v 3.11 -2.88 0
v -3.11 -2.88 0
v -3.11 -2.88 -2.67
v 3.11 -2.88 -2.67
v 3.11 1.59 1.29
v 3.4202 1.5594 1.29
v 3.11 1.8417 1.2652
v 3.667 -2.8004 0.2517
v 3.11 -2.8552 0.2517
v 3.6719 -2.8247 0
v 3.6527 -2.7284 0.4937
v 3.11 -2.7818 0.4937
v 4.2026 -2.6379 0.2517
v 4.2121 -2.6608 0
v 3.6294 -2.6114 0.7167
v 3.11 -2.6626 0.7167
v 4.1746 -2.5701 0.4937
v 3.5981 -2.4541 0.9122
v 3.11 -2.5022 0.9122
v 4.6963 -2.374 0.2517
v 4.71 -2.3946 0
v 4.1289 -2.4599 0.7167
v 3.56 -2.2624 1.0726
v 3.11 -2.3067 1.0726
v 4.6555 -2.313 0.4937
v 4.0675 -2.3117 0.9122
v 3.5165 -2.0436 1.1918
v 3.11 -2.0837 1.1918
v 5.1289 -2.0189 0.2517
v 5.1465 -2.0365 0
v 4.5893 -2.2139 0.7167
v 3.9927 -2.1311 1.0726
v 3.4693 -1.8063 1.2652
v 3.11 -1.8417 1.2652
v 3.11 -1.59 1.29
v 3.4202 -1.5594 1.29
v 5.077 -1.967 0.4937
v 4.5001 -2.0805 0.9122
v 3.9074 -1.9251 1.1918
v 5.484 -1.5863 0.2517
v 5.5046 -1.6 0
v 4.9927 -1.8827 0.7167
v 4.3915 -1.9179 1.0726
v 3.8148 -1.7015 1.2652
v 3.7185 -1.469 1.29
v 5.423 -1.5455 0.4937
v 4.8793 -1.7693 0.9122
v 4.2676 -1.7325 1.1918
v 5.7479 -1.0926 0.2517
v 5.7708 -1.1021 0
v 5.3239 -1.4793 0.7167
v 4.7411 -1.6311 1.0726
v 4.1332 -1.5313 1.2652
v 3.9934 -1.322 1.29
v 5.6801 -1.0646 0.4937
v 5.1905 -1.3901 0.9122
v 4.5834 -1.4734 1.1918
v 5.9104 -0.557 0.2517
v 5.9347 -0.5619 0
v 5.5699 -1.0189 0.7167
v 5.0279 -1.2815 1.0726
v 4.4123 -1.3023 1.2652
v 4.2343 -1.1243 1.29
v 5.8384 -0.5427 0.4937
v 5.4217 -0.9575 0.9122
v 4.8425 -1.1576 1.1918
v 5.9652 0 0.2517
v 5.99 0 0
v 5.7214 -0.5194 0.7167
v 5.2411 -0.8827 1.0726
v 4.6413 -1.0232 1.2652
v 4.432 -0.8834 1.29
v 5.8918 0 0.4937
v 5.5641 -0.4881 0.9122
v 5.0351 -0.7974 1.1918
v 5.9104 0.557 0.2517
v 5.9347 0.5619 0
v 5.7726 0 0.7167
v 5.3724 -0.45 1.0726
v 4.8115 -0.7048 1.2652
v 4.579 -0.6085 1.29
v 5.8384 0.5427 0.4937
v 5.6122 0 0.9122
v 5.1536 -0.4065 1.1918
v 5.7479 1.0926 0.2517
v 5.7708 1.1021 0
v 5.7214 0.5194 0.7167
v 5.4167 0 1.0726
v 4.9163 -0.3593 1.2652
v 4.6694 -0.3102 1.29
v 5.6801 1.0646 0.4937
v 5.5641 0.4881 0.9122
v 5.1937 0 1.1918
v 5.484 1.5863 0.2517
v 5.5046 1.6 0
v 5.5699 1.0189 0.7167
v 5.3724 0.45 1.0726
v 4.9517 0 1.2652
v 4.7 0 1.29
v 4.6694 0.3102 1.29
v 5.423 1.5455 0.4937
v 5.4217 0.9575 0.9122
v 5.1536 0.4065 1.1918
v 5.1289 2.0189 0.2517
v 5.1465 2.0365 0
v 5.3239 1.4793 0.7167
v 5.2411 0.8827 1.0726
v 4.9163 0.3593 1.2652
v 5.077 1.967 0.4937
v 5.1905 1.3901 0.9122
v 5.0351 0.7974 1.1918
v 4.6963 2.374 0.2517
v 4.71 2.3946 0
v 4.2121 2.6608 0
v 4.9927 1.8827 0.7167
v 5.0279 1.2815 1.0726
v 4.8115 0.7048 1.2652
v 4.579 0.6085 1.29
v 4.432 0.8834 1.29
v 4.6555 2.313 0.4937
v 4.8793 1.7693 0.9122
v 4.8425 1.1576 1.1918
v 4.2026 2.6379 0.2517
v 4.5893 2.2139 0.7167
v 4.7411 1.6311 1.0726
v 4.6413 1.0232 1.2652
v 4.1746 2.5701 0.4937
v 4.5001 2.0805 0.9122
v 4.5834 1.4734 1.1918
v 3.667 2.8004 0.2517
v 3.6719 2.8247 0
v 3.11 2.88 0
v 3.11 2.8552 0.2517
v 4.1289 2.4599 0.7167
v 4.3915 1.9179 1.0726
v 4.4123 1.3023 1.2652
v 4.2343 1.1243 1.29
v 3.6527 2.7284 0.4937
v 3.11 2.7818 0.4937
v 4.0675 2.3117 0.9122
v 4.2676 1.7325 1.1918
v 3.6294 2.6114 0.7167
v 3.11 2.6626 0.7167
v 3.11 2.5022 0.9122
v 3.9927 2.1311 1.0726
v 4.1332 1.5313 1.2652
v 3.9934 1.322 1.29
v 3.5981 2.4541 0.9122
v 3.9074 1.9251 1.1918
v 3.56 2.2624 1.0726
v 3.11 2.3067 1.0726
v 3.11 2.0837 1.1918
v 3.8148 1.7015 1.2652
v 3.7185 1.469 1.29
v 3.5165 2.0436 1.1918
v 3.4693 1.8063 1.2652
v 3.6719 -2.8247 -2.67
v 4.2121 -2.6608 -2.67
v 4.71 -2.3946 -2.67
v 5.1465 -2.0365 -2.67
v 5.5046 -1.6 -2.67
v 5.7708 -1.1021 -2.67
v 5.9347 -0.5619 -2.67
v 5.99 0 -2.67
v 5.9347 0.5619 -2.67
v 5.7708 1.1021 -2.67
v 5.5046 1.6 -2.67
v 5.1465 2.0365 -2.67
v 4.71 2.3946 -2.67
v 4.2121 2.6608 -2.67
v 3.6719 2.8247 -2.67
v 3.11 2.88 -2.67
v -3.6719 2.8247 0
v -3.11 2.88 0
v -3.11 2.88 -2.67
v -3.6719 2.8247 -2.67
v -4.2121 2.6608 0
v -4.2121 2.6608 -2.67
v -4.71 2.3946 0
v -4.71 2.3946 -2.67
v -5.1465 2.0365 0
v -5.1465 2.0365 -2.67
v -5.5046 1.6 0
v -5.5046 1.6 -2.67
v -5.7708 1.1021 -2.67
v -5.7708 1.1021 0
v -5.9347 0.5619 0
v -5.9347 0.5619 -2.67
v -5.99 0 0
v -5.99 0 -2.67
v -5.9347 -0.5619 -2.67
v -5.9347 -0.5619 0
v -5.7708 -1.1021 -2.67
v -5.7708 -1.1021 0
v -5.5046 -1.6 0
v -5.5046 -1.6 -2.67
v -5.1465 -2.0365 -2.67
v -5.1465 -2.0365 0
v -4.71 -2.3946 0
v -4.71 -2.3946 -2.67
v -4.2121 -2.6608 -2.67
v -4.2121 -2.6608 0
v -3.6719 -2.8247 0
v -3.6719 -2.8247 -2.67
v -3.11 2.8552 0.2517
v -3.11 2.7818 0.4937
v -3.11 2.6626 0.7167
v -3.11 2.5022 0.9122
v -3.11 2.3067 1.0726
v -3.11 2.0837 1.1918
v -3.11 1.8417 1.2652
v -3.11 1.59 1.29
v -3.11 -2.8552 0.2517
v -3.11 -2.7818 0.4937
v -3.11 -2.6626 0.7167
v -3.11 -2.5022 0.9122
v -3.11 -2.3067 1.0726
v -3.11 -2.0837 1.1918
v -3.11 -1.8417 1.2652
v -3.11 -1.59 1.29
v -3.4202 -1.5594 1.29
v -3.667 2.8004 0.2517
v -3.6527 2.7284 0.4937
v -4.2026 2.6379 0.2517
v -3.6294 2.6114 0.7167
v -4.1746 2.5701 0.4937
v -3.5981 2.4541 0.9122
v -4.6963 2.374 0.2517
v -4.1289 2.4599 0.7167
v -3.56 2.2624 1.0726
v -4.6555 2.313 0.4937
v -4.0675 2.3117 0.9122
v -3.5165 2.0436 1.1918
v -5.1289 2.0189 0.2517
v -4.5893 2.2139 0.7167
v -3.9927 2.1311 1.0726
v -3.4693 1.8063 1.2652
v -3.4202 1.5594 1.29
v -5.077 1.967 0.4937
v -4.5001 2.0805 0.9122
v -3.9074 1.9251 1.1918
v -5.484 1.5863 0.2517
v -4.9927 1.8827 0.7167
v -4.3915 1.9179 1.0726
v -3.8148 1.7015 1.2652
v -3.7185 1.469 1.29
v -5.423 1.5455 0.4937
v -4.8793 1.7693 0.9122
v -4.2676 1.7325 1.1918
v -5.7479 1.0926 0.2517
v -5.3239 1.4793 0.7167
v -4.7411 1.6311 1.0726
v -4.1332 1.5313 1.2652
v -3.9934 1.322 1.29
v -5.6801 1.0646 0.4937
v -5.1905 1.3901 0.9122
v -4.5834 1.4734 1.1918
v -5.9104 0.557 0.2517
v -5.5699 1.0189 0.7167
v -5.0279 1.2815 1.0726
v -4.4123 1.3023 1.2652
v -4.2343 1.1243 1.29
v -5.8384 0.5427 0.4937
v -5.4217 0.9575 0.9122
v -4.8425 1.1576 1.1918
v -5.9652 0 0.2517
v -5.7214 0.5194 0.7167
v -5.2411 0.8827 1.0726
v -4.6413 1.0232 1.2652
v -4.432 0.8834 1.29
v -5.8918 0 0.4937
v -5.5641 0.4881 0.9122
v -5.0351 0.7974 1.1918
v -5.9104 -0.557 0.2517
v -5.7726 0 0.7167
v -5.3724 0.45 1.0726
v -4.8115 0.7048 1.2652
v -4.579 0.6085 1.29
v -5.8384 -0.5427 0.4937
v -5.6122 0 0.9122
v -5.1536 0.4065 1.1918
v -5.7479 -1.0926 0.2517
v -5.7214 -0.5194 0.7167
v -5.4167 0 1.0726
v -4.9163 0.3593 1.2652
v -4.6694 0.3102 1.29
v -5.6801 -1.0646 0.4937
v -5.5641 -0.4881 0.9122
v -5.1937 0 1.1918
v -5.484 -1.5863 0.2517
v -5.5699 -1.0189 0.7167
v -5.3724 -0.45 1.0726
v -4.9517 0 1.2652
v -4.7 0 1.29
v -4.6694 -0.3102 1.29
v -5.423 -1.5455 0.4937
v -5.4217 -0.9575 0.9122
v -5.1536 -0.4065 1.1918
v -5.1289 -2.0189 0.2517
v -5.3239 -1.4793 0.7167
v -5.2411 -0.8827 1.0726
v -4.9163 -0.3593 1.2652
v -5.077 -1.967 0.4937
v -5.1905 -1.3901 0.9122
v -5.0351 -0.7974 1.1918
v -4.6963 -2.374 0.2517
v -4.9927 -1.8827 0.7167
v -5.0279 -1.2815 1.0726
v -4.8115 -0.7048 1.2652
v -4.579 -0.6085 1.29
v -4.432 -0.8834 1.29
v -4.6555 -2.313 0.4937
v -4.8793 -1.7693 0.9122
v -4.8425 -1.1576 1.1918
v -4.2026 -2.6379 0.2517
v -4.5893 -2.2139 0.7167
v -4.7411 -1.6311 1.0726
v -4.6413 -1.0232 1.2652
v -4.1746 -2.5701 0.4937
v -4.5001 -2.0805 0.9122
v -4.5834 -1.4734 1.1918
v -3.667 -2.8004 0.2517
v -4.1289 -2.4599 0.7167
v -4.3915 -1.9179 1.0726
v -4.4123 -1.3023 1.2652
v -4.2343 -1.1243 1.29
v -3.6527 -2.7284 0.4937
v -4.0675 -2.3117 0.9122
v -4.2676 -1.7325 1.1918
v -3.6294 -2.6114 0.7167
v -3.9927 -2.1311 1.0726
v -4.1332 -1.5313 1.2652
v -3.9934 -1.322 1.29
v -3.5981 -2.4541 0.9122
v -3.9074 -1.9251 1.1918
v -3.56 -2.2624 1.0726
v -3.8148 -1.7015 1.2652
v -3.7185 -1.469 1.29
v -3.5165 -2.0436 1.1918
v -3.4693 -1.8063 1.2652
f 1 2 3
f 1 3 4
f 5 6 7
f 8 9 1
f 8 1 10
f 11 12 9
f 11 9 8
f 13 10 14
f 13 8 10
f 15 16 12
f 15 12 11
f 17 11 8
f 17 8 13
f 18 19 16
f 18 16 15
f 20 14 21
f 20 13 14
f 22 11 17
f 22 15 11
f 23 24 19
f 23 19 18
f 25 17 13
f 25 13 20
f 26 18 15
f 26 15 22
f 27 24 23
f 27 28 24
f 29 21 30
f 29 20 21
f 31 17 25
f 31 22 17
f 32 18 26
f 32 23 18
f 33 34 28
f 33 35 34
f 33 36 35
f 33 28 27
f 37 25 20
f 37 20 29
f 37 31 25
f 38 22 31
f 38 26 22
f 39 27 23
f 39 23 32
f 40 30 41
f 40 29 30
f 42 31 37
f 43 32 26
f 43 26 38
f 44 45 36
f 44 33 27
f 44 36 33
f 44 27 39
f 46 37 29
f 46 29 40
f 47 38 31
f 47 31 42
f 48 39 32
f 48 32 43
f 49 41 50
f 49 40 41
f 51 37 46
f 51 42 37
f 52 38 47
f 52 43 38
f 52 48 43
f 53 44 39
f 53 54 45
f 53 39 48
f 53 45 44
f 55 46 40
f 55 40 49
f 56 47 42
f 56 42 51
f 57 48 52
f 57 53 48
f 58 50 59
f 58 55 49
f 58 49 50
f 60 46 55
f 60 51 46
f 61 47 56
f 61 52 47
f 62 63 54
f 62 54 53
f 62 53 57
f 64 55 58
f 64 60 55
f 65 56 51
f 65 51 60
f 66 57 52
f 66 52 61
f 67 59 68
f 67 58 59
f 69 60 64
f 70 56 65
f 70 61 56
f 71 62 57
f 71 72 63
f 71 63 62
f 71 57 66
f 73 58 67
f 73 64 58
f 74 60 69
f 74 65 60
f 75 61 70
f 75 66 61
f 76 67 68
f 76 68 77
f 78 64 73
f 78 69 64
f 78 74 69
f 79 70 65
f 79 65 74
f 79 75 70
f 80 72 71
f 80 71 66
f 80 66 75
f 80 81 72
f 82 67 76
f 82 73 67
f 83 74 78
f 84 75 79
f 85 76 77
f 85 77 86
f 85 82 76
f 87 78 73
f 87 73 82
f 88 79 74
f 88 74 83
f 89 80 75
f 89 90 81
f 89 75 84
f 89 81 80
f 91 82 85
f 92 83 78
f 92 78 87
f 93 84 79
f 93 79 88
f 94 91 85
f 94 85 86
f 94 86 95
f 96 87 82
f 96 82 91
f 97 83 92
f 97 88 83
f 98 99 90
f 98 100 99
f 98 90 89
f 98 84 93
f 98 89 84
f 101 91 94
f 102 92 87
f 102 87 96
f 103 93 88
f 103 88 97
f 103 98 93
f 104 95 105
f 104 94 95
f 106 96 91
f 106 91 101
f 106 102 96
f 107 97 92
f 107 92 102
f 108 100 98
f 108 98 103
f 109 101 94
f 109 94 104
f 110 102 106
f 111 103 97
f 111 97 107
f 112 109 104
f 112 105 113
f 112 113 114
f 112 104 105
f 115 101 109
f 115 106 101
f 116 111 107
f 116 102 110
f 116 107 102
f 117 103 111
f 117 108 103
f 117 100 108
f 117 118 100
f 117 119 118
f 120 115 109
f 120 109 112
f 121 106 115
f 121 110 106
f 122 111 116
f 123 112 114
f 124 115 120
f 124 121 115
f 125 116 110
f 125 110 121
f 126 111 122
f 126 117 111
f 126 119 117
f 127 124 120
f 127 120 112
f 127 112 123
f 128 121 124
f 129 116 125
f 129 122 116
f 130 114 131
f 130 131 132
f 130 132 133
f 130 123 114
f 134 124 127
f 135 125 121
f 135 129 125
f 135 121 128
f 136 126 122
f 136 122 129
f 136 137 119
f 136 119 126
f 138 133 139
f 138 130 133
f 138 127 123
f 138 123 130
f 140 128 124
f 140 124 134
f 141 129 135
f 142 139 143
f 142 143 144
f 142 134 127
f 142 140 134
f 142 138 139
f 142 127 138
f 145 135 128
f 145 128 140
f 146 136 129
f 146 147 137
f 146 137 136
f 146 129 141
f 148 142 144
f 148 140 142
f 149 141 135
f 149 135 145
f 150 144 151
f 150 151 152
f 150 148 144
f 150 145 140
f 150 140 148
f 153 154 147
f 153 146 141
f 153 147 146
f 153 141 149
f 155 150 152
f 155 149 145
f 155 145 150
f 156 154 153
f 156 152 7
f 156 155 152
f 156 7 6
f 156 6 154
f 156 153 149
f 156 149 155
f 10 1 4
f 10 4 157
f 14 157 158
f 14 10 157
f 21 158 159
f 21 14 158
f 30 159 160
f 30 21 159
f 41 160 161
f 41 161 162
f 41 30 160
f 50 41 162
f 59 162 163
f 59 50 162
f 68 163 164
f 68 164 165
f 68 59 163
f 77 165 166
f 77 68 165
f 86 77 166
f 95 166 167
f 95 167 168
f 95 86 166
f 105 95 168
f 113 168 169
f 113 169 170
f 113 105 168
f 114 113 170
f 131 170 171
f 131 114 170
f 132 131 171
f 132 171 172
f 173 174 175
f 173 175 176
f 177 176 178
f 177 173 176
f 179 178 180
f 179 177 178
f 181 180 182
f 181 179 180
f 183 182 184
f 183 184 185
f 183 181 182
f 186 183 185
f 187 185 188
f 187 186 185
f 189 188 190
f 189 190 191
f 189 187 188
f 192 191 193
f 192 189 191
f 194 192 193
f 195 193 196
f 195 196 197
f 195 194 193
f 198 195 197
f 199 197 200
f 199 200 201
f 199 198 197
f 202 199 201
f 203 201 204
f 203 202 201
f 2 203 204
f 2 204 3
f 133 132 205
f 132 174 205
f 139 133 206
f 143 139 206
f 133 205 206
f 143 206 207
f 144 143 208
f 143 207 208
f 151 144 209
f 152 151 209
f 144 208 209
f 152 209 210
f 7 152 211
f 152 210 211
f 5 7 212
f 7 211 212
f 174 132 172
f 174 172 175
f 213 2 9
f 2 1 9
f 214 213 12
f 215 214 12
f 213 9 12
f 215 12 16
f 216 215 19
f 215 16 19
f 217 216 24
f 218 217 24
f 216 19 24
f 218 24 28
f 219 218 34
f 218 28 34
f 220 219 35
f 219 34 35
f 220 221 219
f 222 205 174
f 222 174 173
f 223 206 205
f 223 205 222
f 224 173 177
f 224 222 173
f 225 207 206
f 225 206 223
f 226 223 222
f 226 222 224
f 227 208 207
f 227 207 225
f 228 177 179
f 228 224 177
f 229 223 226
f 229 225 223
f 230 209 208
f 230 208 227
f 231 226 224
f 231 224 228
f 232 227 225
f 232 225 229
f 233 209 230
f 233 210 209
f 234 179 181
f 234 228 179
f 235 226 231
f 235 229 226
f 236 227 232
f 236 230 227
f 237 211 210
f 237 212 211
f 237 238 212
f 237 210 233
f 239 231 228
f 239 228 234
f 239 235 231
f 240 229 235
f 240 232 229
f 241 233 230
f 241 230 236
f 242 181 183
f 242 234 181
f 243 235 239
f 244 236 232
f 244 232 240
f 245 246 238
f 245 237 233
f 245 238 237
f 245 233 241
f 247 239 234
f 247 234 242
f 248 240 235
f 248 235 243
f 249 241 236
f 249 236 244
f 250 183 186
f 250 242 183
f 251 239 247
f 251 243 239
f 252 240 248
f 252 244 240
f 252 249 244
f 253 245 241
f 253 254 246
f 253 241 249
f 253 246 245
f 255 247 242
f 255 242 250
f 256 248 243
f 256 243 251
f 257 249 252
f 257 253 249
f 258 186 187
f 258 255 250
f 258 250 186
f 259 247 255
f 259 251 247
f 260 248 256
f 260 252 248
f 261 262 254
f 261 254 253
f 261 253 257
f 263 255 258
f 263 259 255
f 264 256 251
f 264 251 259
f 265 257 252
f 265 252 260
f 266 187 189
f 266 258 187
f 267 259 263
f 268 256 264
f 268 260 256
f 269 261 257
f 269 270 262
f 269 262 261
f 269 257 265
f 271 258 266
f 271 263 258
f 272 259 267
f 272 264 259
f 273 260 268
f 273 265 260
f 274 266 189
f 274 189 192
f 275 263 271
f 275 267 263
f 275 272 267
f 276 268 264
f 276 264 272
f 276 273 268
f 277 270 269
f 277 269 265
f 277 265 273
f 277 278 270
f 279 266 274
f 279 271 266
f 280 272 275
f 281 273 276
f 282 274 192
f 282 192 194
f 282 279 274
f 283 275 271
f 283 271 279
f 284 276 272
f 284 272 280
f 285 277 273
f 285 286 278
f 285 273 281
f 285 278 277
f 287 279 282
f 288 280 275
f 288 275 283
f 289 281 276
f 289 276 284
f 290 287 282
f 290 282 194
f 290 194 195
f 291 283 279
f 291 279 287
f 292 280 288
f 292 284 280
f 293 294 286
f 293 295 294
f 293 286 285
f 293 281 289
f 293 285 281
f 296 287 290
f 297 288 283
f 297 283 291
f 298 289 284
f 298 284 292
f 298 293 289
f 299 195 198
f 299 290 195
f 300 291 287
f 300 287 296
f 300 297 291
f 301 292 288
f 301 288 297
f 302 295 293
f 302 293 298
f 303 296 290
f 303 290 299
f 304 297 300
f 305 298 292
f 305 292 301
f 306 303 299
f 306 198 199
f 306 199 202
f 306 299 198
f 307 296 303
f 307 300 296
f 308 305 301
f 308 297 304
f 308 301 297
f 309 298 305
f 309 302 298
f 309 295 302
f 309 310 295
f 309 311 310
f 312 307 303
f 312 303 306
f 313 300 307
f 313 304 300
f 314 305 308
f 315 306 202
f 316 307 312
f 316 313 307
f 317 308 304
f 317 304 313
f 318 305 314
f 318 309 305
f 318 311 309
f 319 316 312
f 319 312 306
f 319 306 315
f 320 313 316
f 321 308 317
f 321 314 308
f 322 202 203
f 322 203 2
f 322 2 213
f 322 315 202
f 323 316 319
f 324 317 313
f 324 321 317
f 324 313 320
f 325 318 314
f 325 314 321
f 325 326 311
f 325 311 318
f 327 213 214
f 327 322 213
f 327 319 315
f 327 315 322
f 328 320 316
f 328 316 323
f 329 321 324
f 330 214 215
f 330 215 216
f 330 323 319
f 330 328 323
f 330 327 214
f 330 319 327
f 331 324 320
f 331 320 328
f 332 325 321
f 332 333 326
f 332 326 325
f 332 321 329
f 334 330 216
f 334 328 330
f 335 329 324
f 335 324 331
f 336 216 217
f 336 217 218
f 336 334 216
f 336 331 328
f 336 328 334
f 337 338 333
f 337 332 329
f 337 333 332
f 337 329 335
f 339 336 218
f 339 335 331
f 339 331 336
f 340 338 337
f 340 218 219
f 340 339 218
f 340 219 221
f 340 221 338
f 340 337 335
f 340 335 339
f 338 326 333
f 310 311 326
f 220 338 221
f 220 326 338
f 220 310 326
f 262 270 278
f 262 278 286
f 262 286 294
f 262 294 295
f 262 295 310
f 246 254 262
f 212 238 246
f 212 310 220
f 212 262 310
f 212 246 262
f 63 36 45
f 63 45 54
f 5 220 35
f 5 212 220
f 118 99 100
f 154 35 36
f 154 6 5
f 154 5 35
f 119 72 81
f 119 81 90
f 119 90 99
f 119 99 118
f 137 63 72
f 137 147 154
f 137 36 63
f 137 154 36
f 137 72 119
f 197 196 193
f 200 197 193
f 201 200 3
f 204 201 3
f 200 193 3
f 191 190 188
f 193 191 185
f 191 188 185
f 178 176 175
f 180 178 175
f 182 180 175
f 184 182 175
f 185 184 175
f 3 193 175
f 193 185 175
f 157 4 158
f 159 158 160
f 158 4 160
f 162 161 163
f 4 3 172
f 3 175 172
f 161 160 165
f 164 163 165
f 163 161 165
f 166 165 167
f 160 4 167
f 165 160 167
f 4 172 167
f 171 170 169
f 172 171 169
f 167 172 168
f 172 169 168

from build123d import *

# Parameters (mm, degrees)
F1_DEPTH      = 1.29
F1_DEPTH_BACK = 2.67
F2_R          = 1.29


with BuildPart() as f1:
    # F0 (on Top) → F1 (new body, two sides)
    with BuildSketch(Plane.XY) as f1_sk:
        with BuildLine():
            Line((3.11, 2.88), (-3.11, 2.88))
            ThreePointArc((-3.11, 2.88), (-5.99, 0), (-3.11, -2.88))
            Line((-3.11, -2.88), (3.11, -2.88))
            ThreePointArc((3.11, -2.88), (5.99, 0), (3.11, 2.88))
        make_face()
    extrude(amount=F1_DEPTH)
    extrude(f1_sk.sketch, amount=-F1_DEPTH_BACK)

    # F2
    f2_edges = [f1.edges().sort_by_distance(p)[0] for p in [
        (5.99, 0, 1.29),
        (0, 2.88, 1.29),
        (0, -2.88, 1.29),
        (-5.99, 0, 1.29),
    ]]
    fillet(f2_edges, radius=F2_R)


solid = f1.part
